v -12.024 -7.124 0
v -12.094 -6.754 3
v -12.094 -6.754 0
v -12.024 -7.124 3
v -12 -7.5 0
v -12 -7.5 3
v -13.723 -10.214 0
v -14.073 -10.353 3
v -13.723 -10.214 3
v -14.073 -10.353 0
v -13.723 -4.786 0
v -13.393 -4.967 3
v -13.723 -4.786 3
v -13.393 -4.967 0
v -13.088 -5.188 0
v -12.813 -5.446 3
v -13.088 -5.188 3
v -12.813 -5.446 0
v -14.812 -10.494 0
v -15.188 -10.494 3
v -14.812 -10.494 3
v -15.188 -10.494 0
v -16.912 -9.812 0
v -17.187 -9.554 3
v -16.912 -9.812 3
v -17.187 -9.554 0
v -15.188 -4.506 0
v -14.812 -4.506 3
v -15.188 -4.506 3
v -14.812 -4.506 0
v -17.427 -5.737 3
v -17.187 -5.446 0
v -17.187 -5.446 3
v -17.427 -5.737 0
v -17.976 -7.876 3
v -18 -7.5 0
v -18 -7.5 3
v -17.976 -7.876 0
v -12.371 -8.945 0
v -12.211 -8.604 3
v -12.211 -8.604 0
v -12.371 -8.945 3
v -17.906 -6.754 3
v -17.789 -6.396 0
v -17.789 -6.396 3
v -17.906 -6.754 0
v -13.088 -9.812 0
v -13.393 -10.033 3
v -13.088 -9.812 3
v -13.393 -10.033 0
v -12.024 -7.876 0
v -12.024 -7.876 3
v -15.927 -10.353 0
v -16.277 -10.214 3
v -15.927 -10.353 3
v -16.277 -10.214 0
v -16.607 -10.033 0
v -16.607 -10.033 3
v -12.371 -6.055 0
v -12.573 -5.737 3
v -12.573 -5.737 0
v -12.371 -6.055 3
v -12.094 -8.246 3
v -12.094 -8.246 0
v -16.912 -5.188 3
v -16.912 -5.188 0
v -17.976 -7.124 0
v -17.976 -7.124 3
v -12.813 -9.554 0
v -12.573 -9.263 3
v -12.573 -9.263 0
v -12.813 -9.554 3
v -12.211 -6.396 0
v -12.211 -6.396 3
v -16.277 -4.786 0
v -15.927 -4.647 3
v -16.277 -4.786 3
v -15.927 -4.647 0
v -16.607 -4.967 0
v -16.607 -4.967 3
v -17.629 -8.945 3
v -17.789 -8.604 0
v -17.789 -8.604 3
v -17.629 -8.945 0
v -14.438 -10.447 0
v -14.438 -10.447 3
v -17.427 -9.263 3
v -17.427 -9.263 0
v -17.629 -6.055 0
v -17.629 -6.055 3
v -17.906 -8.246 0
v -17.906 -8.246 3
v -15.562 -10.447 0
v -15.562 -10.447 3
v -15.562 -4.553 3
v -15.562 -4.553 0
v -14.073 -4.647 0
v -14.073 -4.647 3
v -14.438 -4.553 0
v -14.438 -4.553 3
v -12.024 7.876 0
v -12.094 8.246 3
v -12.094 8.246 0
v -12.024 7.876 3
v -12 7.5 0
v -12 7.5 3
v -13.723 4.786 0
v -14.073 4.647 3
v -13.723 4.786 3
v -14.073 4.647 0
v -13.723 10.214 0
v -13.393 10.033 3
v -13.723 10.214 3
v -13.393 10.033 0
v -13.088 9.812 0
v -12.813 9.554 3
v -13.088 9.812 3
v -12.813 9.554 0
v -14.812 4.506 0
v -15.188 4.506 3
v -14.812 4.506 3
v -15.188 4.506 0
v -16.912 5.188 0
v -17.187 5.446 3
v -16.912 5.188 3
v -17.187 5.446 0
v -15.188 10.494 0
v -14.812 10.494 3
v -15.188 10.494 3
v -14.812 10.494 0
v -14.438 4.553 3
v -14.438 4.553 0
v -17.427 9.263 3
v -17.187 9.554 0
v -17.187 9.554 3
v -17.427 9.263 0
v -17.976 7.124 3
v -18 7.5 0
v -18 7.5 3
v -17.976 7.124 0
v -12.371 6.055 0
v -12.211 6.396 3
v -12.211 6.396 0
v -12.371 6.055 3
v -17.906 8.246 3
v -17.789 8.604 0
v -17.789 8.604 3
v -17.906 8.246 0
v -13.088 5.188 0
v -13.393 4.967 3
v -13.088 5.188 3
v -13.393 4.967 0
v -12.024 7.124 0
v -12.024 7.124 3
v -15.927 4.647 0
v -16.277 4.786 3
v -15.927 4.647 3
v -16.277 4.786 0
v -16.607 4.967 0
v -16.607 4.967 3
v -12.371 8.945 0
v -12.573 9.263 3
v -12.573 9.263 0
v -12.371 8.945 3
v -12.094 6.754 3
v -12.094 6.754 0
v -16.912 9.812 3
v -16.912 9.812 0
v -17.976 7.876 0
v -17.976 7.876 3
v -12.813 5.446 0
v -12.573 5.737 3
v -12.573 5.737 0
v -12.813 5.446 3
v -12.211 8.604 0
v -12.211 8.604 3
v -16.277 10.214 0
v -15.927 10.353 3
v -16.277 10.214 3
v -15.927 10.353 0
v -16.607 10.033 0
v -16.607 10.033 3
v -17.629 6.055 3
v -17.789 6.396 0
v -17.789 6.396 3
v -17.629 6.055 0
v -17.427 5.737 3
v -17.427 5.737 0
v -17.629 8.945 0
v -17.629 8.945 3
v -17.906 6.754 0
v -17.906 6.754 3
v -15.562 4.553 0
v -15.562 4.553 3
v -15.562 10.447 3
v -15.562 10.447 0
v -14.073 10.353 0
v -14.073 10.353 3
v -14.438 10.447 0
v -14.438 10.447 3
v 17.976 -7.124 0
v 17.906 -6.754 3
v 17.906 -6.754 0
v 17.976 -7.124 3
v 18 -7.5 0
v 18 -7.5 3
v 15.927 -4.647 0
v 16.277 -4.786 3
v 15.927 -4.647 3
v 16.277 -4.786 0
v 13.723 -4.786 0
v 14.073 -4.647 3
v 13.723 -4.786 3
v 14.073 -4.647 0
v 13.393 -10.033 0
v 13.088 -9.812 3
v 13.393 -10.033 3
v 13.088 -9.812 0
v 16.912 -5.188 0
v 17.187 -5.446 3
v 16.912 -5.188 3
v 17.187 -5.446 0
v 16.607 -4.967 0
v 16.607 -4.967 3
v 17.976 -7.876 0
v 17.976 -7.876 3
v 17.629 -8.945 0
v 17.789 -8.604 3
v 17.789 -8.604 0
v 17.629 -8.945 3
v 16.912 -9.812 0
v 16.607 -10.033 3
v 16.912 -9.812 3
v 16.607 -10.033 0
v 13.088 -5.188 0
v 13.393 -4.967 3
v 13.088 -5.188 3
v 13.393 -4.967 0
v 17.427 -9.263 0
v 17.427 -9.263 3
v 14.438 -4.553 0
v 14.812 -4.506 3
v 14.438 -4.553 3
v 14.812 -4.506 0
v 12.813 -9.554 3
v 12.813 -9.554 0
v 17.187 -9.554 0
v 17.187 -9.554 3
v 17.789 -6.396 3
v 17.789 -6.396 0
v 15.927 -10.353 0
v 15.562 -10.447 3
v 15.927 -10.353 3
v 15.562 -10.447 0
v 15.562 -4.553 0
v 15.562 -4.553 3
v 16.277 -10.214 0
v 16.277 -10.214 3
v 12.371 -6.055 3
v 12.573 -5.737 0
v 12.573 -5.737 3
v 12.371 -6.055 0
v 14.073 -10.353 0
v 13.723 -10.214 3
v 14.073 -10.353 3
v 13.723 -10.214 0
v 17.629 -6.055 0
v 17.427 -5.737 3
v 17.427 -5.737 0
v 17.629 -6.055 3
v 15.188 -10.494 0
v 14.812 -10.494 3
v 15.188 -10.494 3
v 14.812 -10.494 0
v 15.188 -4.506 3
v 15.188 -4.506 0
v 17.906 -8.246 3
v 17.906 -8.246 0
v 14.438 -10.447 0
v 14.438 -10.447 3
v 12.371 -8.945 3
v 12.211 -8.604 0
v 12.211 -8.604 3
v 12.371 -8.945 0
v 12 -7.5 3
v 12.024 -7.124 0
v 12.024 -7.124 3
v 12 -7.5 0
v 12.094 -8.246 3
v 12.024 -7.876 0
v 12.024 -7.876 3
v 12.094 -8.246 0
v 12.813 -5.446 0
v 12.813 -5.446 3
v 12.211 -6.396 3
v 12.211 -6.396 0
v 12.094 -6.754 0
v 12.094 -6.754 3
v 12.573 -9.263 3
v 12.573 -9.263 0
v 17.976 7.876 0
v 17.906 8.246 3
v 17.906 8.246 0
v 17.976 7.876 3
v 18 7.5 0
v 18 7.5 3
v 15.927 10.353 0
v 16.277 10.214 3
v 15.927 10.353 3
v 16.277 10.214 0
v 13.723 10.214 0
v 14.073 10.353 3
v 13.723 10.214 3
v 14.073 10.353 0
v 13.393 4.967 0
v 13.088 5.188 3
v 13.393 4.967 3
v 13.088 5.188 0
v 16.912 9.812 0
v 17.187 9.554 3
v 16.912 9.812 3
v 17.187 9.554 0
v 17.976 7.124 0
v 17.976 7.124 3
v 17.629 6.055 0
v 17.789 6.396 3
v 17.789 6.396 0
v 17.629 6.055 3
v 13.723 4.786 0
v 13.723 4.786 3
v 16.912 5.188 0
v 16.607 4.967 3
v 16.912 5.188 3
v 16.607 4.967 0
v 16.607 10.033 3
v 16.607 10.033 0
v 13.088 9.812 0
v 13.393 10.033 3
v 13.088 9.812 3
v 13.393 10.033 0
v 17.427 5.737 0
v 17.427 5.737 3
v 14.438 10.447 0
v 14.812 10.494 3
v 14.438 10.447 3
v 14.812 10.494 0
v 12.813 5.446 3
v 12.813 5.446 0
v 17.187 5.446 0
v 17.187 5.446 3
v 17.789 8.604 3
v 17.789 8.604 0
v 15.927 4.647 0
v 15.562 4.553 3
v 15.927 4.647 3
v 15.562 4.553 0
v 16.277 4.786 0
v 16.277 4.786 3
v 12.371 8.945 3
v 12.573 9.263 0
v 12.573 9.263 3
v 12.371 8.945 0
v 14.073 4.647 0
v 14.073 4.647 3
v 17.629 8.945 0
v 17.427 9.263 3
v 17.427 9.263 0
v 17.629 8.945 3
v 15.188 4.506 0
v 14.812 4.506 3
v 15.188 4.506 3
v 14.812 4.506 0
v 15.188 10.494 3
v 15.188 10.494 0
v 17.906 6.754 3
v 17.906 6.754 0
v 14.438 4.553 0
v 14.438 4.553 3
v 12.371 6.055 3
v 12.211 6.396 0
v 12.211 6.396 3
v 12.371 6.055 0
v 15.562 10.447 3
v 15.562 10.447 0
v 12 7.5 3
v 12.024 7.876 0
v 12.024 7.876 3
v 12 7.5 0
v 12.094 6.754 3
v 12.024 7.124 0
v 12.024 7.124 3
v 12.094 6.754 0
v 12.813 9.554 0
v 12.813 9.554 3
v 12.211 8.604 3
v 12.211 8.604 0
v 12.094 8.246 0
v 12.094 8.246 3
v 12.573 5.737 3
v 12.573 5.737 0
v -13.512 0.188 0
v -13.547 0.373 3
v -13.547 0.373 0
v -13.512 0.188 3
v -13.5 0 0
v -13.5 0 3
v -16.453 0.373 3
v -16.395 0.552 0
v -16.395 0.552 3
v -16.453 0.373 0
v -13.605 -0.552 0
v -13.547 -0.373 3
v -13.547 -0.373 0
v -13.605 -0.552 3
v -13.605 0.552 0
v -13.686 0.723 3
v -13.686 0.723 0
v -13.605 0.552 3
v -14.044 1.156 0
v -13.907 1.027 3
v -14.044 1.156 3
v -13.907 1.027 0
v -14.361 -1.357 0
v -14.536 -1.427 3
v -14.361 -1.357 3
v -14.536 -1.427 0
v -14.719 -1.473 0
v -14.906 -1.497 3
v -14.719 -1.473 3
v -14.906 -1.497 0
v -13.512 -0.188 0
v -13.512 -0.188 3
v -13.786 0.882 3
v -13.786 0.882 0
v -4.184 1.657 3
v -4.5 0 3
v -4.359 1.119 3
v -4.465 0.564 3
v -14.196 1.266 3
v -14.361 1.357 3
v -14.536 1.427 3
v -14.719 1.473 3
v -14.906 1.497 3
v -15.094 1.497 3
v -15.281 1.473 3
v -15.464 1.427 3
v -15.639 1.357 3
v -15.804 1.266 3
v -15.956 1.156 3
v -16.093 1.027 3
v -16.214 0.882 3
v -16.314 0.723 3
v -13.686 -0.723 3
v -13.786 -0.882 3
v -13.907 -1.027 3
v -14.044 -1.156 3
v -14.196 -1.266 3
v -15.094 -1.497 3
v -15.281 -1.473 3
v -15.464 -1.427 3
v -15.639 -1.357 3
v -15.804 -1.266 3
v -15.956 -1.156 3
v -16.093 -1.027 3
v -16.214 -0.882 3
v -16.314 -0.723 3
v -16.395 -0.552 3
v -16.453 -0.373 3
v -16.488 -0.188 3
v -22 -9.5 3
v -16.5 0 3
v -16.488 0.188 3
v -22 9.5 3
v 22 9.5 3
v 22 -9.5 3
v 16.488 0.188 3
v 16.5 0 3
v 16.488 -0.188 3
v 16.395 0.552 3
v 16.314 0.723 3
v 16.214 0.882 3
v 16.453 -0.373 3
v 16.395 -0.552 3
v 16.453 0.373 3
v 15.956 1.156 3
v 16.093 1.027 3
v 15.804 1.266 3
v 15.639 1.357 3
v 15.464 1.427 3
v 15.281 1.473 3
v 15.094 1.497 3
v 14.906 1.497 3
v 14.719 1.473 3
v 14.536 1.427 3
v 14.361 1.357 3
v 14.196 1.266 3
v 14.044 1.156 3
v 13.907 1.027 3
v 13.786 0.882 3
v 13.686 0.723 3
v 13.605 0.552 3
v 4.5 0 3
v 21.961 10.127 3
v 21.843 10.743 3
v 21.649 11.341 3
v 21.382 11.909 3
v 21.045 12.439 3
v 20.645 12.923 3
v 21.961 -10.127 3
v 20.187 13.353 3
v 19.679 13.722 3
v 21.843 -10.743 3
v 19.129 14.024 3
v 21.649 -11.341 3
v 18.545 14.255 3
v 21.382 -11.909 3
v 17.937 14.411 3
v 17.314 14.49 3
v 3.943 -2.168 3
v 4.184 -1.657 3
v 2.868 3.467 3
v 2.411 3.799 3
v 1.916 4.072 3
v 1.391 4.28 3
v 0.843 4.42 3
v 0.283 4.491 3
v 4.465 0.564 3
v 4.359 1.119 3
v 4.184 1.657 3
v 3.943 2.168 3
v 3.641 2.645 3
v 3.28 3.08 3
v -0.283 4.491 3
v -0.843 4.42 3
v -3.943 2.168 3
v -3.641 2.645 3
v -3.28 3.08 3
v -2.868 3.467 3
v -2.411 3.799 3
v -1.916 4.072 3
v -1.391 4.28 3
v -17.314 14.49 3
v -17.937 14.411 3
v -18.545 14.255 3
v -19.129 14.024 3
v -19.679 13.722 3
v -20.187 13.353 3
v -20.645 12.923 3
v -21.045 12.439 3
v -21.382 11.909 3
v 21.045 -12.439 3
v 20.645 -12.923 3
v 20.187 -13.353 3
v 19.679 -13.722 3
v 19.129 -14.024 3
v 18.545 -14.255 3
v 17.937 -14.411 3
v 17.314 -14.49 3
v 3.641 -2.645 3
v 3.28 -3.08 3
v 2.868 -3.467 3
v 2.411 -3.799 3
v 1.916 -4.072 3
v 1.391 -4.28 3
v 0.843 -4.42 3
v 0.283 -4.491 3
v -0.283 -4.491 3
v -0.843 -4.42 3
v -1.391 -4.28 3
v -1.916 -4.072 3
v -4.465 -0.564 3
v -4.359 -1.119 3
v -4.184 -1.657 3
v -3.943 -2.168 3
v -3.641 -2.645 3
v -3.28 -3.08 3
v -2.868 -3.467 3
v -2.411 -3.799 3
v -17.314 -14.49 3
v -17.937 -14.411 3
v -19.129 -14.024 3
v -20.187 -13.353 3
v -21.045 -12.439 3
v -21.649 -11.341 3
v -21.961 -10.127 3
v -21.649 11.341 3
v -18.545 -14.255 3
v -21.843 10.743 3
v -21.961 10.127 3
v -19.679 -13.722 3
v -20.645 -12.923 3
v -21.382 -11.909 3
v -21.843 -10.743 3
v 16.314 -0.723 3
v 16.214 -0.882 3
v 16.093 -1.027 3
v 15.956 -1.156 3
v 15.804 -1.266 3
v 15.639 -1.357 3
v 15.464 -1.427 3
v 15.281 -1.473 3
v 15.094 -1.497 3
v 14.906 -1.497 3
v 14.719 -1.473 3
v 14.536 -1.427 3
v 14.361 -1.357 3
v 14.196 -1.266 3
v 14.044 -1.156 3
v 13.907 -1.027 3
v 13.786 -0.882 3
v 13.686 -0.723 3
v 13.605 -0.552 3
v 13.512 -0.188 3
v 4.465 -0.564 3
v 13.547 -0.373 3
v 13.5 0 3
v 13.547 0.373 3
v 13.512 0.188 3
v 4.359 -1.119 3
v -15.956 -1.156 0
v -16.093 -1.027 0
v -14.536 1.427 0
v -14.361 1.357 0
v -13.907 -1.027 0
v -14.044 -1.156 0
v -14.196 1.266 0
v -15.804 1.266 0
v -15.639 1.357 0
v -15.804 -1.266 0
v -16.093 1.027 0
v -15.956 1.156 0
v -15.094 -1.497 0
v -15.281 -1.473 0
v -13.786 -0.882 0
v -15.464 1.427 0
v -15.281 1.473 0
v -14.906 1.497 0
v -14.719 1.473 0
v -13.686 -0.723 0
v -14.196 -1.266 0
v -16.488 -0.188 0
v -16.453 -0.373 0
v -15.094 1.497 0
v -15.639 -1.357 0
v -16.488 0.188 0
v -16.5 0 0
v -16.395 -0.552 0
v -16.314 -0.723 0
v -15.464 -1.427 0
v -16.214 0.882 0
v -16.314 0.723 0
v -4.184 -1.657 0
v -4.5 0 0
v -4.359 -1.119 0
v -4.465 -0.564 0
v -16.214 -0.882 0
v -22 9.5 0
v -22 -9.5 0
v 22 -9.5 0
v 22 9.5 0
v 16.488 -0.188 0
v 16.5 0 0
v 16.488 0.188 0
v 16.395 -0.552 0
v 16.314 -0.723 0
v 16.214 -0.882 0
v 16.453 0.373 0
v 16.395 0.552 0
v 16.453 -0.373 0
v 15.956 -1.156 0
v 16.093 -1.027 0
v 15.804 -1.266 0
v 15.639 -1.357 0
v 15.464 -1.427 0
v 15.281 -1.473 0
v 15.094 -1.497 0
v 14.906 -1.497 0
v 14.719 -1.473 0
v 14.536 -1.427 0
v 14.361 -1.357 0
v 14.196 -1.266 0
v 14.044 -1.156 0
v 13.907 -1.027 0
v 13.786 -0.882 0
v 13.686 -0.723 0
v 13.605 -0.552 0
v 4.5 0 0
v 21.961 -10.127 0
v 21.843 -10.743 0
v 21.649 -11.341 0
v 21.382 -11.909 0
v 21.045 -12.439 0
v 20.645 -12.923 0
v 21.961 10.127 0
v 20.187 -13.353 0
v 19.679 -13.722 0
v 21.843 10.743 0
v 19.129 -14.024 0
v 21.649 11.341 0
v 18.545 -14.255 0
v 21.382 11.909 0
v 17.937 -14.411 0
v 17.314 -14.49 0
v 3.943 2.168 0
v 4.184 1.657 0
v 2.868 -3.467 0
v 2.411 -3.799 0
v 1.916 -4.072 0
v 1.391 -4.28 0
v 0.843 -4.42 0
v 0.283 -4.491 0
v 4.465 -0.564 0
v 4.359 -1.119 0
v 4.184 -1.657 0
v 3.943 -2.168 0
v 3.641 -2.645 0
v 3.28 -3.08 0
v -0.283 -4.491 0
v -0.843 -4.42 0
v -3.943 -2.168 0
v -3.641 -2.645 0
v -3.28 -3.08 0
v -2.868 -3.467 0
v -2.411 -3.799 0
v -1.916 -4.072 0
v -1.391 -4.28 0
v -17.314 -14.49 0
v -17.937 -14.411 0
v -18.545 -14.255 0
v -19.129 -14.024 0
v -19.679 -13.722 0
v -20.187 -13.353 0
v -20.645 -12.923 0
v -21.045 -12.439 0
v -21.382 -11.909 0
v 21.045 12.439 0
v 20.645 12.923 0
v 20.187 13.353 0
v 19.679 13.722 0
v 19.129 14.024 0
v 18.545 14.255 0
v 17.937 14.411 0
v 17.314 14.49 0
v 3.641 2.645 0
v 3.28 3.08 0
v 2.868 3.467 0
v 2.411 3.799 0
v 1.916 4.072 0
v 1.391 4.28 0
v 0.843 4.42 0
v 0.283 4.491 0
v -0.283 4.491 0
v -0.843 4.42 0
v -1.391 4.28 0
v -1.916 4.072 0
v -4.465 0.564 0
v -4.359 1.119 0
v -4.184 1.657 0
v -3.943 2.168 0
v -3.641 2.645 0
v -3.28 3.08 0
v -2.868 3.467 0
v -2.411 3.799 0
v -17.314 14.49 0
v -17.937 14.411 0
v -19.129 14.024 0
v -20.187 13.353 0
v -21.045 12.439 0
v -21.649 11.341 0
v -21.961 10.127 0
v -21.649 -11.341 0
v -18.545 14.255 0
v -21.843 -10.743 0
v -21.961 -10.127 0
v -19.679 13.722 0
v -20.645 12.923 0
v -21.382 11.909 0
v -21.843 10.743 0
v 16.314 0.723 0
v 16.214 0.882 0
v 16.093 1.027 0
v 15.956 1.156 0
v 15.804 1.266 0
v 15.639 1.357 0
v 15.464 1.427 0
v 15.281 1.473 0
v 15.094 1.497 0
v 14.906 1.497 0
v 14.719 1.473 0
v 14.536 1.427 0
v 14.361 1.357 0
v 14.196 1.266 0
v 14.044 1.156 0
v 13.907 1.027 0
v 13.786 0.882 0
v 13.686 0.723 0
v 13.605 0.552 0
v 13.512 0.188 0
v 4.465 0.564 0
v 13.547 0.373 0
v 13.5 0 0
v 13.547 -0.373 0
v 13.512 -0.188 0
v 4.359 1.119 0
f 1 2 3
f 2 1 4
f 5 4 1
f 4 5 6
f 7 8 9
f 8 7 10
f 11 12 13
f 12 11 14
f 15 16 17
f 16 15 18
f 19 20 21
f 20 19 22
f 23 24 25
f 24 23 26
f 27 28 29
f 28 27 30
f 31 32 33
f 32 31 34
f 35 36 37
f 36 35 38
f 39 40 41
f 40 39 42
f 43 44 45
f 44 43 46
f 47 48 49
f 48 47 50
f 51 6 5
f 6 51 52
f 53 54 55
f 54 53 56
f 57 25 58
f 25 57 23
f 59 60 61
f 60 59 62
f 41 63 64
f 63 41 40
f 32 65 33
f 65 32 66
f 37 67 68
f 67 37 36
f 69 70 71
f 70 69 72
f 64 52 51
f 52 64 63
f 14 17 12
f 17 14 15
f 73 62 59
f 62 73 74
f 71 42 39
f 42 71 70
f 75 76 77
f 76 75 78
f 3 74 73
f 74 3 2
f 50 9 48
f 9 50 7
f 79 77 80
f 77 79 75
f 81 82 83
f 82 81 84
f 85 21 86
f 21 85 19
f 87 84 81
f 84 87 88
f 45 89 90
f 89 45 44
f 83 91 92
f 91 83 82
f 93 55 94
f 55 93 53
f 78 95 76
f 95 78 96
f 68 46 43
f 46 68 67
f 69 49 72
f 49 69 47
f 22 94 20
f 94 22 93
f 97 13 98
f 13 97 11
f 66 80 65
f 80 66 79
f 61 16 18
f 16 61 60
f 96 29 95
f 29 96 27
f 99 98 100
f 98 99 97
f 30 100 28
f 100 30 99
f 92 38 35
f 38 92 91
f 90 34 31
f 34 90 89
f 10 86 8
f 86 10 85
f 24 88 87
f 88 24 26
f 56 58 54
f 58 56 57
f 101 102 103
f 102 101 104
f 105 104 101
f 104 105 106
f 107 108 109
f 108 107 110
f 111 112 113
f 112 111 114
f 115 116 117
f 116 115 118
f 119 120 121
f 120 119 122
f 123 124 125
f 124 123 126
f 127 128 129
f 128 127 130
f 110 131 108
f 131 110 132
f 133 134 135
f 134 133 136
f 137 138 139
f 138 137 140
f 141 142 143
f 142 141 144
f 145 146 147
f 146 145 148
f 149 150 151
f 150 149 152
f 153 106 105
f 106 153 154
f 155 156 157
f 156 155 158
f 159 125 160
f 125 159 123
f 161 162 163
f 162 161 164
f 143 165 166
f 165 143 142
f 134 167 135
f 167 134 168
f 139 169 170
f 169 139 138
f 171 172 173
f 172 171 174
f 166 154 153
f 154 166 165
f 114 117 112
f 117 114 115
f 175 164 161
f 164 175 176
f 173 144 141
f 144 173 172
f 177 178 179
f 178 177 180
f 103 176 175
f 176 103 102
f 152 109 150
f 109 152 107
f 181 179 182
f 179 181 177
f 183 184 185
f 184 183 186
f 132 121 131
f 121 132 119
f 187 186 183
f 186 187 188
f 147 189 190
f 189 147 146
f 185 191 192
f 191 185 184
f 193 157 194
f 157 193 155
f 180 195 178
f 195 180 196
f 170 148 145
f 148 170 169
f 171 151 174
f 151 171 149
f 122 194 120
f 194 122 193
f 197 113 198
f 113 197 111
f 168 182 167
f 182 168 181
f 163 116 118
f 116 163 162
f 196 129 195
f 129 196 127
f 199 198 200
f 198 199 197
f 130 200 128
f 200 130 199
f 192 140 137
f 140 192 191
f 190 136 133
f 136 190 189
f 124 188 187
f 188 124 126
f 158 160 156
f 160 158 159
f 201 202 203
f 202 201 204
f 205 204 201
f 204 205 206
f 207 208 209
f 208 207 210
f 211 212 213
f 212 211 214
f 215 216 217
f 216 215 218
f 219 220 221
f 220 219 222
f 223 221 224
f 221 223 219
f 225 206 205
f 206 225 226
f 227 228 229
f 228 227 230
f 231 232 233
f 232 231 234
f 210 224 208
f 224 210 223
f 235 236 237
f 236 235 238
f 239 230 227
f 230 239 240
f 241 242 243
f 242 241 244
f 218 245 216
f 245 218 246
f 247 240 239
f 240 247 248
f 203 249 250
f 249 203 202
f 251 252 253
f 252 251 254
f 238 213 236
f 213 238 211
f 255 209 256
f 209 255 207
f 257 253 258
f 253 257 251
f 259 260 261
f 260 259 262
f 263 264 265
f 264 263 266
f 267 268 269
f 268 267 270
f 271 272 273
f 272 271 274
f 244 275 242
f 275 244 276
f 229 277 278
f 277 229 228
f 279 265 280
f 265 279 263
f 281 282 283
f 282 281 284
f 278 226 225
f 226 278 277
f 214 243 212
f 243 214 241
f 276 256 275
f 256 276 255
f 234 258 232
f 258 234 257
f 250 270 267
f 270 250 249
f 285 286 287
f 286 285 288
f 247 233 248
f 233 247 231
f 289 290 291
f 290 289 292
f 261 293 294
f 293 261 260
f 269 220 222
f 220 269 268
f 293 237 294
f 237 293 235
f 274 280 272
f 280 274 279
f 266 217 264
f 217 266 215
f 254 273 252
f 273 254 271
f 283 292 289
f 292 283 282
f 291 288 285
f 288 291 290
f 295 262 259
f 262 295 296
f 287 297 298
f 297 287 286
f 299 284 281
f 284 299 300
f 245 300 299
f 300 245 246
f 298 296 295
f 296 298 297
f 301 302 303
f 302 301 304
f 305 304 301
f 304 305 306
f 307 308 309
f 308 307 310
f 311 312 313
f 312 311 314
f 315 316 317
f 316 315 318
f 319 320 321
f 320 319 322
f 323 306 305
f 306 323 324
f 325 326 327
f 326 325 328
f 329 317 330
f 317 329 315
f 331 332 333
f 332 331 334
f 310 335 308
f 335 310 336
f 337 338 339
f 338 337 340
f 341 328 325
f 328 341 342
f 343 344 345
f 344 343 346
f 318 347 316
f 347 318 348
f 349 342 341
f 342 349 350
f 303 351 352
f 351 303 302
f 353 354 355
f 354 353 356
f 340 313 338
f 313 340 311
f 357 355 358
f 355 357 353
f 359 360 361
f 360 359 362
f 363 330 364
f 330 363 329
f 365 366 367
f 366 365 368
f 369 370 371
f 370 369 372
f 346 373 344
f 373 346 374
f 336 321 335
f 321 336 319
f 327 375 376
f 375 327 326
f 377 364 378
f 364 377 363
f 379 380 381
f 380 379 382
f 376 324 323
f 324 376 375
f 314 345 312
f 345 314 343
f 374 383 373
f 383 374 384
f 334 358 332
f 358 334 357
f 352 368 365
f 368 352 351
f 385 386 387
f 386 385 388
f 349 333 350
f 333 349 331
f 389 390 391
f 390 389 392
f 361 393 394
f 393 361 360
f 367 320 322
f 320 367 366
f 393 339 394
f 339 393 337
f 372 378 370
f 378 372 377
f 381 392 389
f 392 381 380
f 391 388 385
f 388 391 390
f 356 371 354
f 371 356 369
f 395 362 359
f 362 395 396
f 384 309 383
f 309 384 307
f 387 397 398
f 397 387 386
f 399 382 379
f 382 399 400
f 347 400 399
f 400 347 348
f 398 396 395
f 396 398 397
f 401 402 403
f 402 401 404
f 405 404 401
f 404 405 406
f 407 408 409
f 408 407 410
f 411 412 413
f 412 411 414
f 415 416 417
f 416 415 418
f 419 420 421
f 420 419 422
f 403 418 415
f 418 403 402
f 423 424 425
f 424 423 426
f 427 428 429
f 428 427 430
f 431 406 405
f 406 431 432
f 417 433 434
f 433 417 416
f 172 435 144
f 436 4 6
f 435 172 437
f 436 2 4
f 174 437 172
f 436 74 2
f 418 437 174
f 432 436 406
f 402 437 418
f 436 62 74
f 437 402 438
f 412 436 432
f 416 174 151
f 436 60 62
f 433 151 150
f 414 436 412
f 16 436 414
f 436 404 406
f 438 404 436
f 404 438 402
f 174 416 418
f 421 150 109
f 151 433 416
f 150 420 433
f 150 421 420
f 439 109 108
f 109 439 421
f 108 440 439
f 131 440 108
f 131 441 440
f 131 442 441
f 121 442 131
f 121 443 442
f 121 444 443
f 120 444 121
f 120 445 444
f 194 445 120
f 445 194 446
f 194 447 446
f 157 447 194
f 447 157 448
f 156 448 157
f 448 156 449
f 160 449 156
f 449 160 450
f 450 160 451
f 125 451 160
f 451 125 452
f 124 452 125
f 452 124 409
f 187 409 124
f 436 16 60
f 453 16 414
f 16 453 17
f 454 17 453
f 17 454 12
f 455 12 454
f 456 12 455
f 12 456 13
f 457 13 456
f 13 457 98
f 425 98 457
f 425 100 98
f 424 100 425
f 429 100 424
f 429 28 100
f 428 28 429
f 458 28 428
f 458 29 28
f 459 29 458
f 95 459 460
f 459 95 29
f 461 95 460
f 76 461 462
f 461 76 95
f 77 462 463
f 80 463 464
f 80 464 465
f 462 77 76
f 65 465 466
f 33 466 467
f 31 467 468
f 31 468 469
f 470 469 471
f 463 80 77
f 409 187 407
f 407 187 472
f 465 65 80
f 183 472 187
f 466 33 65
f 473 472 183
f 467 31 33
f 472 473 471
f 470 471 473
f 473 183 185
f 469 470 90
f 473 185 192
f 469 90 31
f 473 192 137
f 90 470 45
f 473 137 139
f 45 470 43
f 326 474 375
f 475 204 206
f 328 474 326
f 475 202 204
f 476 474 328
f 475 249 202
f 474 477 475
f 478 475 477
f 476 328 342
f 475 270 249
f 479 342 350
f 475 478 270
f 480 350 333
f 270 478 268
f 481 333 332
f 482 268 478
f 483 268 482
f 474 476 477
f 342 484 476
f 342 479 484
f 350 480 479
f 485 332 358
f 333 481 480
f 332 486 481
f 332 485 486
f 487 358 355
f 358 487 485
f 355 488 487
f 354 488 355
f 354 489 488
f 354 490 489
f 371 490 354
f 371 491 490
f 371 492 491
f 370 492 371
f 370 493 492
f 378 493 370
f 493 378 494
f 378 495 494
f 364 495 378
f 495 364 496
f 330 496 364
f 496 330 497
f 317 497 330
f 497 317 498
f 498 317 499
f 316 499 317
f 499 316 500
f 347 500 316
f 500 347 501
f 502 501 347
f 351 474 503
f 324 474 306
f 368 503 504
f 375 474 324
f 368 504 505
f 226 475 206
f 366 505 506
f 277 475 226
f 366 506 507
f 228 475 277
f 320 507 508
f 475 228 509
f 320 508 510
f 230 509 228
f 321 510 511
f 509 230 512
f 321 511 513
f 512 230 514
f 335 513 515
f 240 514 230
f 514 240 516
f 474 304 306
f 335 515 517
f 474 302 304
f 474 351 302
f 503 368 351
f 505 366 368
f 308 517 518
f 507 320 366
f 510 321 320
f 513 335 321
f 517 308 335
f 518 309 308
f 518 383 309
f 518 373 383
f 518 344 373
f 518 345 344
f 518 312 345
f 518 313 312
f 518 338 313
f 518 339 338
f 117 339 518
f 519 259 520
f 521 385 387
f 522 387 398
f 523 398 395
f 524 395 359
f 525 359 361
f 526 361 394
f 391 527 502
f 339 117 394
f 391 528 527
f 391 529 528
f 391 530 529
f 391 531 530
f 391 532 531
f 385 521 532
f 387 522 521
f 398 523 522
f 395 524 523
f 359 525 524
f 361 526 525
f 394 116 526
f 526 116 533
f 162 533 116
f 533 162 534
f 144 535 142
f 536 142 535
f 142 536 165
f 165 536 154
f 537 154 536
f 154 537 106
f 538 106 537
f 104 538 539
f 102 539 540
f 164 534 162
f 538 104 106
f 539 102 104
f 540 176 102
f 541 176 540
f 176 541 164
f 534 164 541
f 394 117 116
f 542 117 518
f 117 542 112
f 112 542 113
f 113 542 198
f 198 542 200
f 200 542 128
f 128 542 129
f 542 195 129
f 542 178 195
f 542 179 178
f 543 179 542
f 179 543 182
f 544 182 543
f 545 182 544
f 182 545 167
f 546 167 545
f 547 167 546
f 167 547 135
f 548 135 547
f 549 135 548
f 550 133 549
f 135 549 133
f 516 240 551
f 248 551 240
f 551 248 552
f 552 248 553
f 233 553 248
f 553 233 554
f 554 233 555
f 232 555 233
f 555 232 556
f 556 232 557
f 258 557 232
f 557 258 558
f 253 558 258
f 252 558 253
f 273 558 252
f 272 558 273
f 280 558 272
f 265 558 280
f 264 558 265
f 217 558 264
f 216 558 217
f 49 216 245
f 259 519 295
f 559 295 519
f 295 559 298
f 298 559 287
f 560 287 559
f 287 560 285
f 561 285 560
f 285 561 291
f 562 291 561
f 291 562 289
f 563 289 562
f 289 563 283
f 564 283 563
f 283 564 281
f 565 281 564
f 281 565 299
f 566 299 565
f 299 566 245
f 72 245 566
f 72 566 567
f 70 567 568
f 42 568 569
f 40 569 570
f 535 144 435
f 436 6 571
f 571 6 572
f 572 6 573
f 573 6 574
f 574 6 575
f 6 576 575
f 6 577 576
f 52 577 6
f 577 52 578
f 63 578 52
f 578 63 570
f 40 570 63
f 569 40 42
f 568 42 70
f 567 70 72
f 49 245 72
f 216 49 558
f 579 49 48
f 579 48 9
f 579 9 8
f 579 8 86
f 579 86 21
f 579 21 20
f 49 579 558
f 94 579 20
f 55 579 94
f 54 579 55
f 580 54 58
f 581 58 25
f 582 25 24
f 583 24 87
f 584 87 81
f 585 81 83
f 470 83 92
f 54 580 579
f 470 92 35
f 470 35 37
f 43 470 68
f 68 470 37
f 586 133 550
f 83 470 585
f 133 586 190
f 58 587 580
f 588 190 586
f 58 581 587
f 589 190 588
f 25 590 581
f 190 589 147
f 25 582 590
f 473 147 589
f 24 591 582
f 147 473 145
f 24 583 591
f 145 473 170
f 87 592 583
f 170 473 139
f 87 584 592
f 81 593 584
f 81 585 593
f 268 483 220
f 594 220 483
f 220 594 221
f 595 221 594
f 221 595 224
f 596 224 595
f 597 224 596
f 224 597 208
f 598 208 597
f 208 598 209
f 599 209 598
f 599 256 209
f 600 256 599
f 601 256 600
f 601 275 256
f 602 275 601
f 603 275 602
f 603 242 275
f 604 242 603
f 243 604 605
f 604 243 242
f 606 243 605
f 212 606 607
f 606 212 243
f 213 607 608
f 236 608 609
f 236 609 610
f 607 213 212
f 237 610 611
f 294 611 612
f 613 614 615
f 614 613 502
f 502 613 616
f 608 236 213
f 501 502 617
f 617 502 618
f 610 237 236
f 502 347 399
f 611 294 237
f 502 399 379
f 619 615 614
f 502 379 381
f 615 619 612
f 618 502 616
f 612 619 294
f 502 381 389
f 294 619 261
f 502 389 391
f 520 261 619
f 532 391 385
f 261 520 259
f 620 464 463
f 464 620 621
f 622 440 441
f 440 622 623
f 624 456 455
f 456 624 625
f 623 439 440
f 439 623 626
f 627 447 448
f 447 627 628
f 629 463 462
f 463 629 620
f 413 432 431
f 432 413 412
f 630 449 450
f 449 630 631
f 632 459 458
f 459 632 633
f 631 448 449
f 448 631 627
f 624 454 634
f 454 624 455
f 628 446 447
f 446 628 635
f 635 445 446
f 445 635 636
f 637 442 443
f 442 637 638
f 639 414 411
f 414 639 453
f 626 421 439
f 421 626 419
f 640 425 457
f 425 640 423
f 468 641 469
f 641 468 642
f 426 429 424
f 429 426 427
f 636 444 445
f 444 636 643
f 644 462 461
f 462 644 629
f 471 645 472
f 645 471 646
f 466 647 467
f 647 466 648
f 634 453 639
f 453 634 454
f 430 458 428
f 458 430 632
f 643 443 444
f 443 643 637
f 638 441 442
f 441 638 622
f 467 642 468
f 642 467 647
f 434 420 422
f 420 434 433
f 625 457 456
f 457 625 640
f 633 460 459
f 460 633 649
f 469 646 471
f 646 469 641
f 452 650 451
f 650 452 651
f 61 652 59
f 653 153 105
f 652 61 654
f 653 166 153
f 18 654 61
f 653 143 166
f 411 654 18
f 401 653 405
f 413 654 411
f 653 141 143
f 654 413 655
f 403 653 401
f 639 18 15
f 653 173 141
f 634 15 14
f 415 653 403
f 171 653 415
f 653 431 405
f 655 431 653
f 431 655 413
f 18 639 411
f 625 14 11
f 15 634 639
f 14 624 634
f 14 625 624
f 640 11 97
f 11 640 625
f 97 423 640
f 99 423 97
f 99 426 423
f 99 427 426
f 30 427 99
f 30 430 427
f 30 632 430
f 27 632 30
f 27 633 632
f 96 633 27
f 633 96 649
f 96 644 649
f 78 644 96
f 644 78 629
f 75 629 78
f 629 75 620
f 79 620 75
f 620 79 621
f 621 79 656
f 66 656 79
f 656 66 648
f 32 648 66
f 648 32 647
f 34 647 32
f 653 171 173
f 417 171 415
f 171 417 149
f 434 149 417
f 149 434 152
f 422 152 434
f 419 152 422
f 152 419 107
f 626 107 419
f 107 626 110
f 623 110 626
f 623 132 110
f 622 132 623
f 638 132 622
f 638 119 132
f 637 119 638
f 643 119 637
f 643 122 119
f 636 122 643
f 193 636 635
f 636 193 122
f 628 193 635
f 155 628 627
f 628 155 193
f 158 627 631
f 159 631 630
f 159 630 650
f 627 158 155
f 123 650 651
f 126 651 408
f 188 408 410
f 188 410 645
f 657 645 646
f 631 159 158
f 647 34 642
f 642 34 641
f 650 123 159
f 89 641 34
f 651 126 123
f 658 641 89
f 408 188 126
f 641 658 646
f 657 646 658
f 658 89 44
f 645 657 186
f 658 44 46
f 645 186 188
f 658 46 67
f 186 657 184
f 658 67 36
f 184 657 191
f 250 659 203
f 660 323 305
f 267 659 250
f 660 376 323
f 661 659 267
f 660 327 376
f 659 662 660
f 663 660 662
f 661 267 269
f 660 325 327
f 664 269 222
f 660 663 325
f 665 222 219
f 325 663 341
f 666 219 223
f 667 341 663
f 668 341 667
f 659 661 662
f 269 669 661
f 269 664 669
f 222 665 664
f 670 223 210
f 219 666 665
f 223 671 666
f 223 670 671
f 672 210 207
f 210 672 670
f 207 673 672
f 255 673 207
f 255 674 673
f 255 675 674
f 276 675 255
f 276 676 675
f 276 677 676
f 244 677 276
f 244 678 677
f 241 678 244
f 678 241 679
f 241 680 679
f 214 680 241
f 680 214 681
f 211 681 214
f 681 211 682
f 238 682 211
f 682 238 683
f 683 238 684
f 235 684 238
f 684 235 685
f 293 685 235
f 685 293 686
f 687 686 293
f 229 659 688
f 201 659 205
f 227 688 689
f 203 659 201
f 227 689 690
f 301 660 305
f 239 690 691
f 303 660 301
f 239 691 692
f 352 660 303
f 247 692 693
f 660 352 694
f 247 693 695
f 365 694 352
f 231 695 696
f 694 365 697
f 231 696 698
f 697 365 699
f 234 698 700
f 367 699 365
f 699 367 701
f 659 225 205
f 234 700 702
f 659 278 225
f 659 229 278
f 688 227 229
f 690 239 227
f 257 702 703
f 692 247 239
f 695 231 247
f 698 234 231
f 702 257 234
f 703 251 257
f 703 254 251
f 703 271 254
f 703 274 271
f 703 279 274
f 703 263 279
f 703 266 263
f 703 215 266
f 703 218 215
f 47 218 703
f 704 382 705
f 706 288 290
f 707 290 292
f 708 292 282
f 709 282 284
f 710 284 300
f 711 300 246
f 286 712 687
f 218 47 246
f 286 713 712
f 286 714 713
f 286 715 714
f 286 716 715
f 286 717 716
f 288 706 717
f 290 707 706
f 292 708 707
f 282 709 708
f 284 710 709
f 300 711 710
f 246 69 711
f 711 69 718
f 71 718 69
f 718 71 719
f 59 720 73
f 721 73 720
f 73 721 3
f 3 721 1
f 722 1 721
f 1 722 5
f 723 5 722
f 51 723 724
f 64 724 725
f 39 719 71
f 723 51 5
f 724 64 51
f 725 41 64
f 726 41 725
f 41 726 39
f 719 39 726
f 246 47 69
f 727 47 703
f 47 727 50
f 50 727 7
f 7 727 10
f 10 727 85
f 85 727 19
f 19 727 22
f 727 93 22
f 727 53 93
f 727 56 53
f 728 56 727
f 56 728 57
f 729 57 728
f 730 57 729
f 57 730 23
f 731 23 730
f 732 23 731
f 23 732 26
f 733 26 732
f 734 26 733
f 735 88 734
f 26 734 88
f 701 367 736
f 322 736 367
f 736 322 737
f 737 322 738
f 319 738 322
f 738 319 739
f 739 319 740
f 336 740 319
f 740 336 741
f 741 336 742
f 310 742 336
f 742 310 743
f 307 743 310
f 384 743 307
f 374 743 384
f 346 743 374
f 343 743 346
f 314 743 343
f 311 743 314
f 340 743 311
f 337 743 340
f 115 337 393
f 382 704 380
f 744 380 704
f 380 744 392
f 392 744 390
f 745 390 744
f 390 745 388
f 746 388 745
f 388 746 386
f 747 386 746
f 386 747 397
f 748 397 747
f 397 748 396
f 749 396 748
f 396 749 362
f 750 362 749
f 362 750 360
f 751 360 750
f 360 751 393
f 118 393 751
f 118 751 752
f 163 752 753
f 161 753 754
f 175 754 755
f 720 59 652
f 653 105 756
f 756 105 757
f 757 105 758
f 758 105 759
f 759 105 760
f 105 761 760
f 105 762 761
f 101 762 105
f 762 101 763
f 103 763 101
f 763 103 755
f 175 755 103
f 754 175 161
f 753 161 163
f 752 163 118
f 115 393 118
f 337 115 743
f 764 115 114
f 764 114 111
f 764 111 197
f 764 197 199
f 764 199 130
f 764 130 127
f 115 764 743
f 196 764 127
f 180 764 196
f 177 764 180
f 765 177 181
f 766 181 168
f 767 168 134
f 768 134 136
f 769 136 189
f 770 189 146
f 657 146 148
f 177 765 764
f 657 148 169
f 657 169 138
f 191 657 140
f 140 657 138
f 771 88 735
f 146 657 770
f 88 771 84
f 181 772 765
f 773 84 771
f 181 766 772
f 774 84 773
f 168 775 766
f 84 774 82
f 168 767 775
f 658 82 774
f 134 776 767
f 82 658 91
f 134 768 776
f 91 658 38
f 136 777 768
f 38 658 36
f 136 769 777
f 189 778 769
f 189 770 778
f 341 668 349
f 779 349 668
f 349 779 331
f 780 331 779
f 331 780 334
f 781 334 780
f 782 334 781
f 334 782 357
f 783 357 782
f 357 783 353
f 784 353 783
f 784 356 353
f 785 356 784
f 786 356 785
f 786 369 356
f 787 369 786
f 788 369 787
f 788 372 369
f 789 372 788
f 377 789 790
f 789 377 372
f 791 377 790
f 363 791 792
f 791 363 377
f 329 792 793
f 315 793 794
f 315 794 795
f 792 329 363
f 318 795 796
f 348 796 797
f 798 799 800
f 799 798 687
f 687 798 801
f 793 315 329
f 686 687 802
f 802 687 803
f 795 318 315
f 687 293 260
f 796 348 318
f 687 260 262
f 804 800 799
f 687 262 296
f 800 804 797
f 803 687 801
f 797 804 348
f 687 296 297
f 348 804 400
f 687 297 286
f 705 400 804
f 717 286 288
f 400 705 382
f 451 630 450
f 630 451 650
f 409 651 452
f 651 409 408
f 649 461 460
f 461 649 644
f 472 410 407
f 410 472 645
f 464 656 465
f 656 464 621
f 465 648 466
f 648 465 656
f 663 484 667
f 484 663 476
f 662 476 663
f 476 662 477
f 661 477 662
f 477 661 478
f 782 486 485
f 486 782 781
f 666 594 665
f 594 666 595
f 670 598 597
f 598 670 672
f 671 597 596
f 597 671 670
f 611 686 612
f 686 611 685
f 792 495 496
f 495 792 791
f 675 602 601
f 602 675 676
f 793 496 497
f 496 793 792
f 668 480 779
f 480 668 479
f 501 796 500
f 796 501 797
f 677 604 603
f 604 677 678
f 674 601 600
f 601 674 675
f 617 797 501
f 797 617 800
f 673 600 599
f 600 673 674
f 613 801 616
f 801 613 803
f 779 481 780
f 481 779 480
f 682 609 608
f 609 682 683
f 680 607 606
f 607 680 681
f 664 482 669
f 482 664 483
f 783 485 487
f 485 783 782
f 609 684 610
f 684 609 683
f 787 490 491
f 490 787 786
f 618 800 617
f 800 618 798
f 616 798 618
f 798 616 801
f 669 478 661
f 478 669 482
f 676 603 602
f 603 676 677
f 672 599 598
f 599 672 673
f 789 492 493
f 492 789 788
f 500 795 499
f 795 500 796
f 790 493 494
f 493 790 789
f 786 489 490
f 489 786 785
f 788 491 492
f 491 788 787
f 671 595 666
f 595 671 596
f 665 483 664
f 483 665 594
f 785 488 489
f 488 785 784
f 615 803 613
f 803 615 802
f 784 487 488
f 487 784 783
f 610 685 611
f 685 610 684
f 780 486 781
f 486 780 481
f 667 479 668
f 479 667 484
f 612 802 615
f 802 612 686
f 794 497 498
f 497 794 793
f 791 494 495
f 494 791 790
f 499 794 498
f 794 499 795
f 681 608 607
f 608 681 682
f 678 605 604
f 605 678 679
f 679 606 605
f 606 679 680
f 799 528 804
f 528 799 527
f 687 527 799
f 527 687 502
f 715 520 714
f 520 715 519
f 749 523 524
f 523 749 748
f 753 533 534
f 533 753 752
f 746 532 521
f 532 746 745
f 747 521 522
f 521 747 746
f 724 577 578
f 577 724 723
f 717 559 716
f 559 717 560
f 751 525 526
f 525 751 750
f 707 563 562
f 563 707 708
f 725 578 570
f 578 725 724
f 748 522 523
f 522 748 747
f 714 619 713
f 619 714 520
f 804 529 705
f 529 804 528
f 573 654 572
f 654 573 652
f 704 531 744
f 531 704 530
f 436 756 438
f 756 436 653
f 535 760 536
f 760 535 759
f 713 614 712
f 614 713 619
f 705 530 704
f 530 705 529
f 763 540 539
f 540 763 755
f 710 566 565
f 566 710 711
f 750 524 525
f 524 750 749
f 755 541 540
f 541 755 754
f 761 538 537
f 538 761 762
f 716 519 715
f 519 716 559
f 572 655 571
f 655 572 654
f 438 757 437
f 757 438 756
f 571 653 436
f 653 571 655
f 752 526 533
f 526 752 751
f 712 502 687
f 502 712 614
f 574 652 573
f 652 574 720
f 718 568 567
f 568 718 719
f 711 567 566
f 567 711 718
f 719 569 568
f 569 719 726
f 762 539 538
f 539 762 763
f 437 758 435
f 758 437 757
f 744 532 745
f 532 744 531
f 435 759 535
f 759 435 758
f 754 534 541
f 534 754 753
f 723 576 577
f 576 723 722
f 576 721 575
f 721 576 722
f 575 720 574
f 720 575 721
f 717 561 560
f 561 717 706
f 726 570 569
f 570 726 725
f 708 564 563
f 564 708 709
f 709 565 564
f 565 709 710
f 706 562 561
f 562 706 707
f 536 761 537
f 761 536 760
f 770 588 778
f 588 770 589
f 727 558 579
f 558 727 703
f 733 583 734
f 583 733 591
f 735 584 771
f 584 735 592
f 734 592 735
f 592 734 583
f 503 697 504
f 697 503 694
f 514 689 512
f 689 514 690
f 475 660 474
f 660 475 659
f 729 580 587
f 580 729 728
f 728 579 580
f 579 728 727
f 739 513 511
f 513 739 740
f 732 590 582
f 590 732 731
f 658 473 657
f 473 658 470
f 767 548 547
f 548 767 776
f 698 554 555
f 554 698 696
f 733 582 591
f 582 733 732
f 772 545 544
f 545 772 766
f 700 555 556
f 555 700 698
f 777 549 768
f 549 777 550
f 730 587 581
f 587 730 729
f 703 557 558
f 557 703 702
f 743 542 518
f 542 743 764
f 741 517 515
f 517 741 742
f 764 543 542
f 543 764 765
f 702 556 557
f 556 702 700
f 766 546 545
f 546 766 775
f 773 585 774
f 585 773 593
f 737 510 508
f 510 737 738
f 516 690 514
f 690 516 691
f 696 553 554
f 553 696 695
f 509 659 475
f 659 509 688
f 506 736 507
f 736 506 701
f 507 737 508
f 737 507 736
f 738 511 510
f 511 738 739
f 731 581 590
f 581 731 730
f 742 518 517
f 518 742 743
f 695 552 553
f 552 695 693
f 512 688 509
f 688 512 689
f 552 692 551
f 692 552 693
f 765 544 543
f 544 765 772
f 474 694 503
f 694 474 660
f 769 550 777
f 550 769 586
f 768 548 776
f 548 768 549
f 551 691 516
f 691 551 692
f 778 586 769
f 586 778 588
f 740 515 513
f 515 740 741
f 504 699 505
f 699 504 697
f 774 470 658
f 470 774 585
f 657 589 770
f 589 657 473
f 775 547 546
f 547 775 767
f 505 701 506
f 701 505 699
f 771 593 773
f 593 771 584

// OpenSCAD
$fn = 50;


difference() {
	union() {
		hull() {
			translate(v = [-17.0000000000, 9.5000000000, 0]) {
				cylinder(h = 3, r = 5);
			}
			translate(v = [17.0000000000, 9.5000000000, 0]) {
				cylinder(h = 3, r = 5);
			}
			translate(v = [-17.0000000000, -9.5000000000, 0]) {
				cylinder(h = 3, r = 5);
			}
			translate(v = [17.0000000000, -9.5000000000, 0]) {
				cylinder(h = 3, r = 5);
			}
		}
	}
	union() {
		#translate(v = [-15.0000000000, -7.5000000000, 0]) {
			cylinder(h = 3, r = 3.0000000000);
		}
		#translate(v = [-15.0000000000, 7.5000000000, 0]) {
			cylinder(h = 3, r = 3.0000000000);
		}
		#translate(v = [15.0000000000, -7.5000000000, 0]) {
			cylinder(h = 3, r = 3.0000000000);
		}
		#translate(v = [15.0000000000, 7.5000000000, 0]) {
			cylinder(h = 3, r = 3.0000000000);
		}
		#translate(v = [-15.0000000000, -7.5000000000, -100.0000000000]) {
			cylinder(h = 200, r = 3.0000000000);
		}
		#translate(v = [-15.0000000000, 7.5000000000, -100.0000000000]) {
			cylinder(h = 200, r = 3.0000000000);
		}
		#translate(v = [15.0000000000, -7.5000000000, -100.0000000000]) {
			cylinder(h = 200, r = 3.0000000000);
		}
		#translate(v = [15.0000000000, 7.5000000000, -100.0000000000]) {
			cylinder(h = 200, r = 3.0000000000);
		}
		#translate(v = [-15.0000000000, -7.5000000000, 0]) {
			cylinder(h = 3, r = 1.5000000000);
		}
		#translate(v = [-15.0000000000, 0.0000000000, 0]) {
			cylinder(h = 3, r = 1.5000000000);
		}
		#translate(v = [-15.0000000000, 7.5000000000, 0]) {
			cylinder(h = 3, r = 1.5000000000);
		}
		#translate(v = [15.0000000000, -7.5000000000, 0]) {
			cylinder(h = 3, r = 1.5000000000);
		}
		#translate(v = [15.0000000000, 0.0000000000, 0]) {
			cylinder(h = 3, r = 1.5000000000);
		}
		#translate(v = [15.0000000000, 7.5000000000, 0]) {
			cylinder(h = 3, r = 1.5000000000);
		}
		#translate(v = [-15.0000000000, -7.5000000000, 0]) {
			cylinder(h = 3, r = 1.5000000000);
		}
		#translate(v = [-15.0000000000, 0.0000000000, 0]) {
			cylinder(h = 3, r = 1.5000000000);
		}
		#translate(v = [-15.0000000000, 7.5000000000, 0]) {
			cylinder(h = 3, r = 1.5000000000);
		}
		#translate(v = [15.0000000000, -7.5000000000, 0]) {
			cylinder(h = 3, r = 1.5000000000);
		}
		#translate(v = [15.0000000000, 0.0000000000, 0]) {
			cylinder(h = 3, r = 1.5000000000);
		}
		#translate(v = [15.0000000000, 7.5000000000, 0]) {
			cylinder(h = 3, r = 1.5000000000);
		}
		#translate(v = [-15.0000000000, -7.5000000000, 0]) {
			cylinder(h = 3, r = 1.5000000000);
		}
		#translate(v = [-15.0000000000, 0.0000000000, 0]) {
			cylinder(h = 3, r = 1.5000000000);
		}
		#translate(v = [-15.0000000000, 7.5000000000, 0]) {
			cylinder(h = 3, r = 1.5000000000);
		}
		#translate(v = [15.0000000000, -7.5000000000, 0]) {
			cylinder(h = 3, r = 1.5000000000);
		}
		#translate(v = [15.0000000000, 0.0000000000, 0]) {
			cylinder(h = 3, r = 1.5000000000);
		}
		#translate(v = [15.0000000000, 7.5000000000, 0]) {
			cylinder(h = 3, r = 1.5000000000);
		}
		#cylinder(h = 3, r = 4.5000000000);
	}
}
